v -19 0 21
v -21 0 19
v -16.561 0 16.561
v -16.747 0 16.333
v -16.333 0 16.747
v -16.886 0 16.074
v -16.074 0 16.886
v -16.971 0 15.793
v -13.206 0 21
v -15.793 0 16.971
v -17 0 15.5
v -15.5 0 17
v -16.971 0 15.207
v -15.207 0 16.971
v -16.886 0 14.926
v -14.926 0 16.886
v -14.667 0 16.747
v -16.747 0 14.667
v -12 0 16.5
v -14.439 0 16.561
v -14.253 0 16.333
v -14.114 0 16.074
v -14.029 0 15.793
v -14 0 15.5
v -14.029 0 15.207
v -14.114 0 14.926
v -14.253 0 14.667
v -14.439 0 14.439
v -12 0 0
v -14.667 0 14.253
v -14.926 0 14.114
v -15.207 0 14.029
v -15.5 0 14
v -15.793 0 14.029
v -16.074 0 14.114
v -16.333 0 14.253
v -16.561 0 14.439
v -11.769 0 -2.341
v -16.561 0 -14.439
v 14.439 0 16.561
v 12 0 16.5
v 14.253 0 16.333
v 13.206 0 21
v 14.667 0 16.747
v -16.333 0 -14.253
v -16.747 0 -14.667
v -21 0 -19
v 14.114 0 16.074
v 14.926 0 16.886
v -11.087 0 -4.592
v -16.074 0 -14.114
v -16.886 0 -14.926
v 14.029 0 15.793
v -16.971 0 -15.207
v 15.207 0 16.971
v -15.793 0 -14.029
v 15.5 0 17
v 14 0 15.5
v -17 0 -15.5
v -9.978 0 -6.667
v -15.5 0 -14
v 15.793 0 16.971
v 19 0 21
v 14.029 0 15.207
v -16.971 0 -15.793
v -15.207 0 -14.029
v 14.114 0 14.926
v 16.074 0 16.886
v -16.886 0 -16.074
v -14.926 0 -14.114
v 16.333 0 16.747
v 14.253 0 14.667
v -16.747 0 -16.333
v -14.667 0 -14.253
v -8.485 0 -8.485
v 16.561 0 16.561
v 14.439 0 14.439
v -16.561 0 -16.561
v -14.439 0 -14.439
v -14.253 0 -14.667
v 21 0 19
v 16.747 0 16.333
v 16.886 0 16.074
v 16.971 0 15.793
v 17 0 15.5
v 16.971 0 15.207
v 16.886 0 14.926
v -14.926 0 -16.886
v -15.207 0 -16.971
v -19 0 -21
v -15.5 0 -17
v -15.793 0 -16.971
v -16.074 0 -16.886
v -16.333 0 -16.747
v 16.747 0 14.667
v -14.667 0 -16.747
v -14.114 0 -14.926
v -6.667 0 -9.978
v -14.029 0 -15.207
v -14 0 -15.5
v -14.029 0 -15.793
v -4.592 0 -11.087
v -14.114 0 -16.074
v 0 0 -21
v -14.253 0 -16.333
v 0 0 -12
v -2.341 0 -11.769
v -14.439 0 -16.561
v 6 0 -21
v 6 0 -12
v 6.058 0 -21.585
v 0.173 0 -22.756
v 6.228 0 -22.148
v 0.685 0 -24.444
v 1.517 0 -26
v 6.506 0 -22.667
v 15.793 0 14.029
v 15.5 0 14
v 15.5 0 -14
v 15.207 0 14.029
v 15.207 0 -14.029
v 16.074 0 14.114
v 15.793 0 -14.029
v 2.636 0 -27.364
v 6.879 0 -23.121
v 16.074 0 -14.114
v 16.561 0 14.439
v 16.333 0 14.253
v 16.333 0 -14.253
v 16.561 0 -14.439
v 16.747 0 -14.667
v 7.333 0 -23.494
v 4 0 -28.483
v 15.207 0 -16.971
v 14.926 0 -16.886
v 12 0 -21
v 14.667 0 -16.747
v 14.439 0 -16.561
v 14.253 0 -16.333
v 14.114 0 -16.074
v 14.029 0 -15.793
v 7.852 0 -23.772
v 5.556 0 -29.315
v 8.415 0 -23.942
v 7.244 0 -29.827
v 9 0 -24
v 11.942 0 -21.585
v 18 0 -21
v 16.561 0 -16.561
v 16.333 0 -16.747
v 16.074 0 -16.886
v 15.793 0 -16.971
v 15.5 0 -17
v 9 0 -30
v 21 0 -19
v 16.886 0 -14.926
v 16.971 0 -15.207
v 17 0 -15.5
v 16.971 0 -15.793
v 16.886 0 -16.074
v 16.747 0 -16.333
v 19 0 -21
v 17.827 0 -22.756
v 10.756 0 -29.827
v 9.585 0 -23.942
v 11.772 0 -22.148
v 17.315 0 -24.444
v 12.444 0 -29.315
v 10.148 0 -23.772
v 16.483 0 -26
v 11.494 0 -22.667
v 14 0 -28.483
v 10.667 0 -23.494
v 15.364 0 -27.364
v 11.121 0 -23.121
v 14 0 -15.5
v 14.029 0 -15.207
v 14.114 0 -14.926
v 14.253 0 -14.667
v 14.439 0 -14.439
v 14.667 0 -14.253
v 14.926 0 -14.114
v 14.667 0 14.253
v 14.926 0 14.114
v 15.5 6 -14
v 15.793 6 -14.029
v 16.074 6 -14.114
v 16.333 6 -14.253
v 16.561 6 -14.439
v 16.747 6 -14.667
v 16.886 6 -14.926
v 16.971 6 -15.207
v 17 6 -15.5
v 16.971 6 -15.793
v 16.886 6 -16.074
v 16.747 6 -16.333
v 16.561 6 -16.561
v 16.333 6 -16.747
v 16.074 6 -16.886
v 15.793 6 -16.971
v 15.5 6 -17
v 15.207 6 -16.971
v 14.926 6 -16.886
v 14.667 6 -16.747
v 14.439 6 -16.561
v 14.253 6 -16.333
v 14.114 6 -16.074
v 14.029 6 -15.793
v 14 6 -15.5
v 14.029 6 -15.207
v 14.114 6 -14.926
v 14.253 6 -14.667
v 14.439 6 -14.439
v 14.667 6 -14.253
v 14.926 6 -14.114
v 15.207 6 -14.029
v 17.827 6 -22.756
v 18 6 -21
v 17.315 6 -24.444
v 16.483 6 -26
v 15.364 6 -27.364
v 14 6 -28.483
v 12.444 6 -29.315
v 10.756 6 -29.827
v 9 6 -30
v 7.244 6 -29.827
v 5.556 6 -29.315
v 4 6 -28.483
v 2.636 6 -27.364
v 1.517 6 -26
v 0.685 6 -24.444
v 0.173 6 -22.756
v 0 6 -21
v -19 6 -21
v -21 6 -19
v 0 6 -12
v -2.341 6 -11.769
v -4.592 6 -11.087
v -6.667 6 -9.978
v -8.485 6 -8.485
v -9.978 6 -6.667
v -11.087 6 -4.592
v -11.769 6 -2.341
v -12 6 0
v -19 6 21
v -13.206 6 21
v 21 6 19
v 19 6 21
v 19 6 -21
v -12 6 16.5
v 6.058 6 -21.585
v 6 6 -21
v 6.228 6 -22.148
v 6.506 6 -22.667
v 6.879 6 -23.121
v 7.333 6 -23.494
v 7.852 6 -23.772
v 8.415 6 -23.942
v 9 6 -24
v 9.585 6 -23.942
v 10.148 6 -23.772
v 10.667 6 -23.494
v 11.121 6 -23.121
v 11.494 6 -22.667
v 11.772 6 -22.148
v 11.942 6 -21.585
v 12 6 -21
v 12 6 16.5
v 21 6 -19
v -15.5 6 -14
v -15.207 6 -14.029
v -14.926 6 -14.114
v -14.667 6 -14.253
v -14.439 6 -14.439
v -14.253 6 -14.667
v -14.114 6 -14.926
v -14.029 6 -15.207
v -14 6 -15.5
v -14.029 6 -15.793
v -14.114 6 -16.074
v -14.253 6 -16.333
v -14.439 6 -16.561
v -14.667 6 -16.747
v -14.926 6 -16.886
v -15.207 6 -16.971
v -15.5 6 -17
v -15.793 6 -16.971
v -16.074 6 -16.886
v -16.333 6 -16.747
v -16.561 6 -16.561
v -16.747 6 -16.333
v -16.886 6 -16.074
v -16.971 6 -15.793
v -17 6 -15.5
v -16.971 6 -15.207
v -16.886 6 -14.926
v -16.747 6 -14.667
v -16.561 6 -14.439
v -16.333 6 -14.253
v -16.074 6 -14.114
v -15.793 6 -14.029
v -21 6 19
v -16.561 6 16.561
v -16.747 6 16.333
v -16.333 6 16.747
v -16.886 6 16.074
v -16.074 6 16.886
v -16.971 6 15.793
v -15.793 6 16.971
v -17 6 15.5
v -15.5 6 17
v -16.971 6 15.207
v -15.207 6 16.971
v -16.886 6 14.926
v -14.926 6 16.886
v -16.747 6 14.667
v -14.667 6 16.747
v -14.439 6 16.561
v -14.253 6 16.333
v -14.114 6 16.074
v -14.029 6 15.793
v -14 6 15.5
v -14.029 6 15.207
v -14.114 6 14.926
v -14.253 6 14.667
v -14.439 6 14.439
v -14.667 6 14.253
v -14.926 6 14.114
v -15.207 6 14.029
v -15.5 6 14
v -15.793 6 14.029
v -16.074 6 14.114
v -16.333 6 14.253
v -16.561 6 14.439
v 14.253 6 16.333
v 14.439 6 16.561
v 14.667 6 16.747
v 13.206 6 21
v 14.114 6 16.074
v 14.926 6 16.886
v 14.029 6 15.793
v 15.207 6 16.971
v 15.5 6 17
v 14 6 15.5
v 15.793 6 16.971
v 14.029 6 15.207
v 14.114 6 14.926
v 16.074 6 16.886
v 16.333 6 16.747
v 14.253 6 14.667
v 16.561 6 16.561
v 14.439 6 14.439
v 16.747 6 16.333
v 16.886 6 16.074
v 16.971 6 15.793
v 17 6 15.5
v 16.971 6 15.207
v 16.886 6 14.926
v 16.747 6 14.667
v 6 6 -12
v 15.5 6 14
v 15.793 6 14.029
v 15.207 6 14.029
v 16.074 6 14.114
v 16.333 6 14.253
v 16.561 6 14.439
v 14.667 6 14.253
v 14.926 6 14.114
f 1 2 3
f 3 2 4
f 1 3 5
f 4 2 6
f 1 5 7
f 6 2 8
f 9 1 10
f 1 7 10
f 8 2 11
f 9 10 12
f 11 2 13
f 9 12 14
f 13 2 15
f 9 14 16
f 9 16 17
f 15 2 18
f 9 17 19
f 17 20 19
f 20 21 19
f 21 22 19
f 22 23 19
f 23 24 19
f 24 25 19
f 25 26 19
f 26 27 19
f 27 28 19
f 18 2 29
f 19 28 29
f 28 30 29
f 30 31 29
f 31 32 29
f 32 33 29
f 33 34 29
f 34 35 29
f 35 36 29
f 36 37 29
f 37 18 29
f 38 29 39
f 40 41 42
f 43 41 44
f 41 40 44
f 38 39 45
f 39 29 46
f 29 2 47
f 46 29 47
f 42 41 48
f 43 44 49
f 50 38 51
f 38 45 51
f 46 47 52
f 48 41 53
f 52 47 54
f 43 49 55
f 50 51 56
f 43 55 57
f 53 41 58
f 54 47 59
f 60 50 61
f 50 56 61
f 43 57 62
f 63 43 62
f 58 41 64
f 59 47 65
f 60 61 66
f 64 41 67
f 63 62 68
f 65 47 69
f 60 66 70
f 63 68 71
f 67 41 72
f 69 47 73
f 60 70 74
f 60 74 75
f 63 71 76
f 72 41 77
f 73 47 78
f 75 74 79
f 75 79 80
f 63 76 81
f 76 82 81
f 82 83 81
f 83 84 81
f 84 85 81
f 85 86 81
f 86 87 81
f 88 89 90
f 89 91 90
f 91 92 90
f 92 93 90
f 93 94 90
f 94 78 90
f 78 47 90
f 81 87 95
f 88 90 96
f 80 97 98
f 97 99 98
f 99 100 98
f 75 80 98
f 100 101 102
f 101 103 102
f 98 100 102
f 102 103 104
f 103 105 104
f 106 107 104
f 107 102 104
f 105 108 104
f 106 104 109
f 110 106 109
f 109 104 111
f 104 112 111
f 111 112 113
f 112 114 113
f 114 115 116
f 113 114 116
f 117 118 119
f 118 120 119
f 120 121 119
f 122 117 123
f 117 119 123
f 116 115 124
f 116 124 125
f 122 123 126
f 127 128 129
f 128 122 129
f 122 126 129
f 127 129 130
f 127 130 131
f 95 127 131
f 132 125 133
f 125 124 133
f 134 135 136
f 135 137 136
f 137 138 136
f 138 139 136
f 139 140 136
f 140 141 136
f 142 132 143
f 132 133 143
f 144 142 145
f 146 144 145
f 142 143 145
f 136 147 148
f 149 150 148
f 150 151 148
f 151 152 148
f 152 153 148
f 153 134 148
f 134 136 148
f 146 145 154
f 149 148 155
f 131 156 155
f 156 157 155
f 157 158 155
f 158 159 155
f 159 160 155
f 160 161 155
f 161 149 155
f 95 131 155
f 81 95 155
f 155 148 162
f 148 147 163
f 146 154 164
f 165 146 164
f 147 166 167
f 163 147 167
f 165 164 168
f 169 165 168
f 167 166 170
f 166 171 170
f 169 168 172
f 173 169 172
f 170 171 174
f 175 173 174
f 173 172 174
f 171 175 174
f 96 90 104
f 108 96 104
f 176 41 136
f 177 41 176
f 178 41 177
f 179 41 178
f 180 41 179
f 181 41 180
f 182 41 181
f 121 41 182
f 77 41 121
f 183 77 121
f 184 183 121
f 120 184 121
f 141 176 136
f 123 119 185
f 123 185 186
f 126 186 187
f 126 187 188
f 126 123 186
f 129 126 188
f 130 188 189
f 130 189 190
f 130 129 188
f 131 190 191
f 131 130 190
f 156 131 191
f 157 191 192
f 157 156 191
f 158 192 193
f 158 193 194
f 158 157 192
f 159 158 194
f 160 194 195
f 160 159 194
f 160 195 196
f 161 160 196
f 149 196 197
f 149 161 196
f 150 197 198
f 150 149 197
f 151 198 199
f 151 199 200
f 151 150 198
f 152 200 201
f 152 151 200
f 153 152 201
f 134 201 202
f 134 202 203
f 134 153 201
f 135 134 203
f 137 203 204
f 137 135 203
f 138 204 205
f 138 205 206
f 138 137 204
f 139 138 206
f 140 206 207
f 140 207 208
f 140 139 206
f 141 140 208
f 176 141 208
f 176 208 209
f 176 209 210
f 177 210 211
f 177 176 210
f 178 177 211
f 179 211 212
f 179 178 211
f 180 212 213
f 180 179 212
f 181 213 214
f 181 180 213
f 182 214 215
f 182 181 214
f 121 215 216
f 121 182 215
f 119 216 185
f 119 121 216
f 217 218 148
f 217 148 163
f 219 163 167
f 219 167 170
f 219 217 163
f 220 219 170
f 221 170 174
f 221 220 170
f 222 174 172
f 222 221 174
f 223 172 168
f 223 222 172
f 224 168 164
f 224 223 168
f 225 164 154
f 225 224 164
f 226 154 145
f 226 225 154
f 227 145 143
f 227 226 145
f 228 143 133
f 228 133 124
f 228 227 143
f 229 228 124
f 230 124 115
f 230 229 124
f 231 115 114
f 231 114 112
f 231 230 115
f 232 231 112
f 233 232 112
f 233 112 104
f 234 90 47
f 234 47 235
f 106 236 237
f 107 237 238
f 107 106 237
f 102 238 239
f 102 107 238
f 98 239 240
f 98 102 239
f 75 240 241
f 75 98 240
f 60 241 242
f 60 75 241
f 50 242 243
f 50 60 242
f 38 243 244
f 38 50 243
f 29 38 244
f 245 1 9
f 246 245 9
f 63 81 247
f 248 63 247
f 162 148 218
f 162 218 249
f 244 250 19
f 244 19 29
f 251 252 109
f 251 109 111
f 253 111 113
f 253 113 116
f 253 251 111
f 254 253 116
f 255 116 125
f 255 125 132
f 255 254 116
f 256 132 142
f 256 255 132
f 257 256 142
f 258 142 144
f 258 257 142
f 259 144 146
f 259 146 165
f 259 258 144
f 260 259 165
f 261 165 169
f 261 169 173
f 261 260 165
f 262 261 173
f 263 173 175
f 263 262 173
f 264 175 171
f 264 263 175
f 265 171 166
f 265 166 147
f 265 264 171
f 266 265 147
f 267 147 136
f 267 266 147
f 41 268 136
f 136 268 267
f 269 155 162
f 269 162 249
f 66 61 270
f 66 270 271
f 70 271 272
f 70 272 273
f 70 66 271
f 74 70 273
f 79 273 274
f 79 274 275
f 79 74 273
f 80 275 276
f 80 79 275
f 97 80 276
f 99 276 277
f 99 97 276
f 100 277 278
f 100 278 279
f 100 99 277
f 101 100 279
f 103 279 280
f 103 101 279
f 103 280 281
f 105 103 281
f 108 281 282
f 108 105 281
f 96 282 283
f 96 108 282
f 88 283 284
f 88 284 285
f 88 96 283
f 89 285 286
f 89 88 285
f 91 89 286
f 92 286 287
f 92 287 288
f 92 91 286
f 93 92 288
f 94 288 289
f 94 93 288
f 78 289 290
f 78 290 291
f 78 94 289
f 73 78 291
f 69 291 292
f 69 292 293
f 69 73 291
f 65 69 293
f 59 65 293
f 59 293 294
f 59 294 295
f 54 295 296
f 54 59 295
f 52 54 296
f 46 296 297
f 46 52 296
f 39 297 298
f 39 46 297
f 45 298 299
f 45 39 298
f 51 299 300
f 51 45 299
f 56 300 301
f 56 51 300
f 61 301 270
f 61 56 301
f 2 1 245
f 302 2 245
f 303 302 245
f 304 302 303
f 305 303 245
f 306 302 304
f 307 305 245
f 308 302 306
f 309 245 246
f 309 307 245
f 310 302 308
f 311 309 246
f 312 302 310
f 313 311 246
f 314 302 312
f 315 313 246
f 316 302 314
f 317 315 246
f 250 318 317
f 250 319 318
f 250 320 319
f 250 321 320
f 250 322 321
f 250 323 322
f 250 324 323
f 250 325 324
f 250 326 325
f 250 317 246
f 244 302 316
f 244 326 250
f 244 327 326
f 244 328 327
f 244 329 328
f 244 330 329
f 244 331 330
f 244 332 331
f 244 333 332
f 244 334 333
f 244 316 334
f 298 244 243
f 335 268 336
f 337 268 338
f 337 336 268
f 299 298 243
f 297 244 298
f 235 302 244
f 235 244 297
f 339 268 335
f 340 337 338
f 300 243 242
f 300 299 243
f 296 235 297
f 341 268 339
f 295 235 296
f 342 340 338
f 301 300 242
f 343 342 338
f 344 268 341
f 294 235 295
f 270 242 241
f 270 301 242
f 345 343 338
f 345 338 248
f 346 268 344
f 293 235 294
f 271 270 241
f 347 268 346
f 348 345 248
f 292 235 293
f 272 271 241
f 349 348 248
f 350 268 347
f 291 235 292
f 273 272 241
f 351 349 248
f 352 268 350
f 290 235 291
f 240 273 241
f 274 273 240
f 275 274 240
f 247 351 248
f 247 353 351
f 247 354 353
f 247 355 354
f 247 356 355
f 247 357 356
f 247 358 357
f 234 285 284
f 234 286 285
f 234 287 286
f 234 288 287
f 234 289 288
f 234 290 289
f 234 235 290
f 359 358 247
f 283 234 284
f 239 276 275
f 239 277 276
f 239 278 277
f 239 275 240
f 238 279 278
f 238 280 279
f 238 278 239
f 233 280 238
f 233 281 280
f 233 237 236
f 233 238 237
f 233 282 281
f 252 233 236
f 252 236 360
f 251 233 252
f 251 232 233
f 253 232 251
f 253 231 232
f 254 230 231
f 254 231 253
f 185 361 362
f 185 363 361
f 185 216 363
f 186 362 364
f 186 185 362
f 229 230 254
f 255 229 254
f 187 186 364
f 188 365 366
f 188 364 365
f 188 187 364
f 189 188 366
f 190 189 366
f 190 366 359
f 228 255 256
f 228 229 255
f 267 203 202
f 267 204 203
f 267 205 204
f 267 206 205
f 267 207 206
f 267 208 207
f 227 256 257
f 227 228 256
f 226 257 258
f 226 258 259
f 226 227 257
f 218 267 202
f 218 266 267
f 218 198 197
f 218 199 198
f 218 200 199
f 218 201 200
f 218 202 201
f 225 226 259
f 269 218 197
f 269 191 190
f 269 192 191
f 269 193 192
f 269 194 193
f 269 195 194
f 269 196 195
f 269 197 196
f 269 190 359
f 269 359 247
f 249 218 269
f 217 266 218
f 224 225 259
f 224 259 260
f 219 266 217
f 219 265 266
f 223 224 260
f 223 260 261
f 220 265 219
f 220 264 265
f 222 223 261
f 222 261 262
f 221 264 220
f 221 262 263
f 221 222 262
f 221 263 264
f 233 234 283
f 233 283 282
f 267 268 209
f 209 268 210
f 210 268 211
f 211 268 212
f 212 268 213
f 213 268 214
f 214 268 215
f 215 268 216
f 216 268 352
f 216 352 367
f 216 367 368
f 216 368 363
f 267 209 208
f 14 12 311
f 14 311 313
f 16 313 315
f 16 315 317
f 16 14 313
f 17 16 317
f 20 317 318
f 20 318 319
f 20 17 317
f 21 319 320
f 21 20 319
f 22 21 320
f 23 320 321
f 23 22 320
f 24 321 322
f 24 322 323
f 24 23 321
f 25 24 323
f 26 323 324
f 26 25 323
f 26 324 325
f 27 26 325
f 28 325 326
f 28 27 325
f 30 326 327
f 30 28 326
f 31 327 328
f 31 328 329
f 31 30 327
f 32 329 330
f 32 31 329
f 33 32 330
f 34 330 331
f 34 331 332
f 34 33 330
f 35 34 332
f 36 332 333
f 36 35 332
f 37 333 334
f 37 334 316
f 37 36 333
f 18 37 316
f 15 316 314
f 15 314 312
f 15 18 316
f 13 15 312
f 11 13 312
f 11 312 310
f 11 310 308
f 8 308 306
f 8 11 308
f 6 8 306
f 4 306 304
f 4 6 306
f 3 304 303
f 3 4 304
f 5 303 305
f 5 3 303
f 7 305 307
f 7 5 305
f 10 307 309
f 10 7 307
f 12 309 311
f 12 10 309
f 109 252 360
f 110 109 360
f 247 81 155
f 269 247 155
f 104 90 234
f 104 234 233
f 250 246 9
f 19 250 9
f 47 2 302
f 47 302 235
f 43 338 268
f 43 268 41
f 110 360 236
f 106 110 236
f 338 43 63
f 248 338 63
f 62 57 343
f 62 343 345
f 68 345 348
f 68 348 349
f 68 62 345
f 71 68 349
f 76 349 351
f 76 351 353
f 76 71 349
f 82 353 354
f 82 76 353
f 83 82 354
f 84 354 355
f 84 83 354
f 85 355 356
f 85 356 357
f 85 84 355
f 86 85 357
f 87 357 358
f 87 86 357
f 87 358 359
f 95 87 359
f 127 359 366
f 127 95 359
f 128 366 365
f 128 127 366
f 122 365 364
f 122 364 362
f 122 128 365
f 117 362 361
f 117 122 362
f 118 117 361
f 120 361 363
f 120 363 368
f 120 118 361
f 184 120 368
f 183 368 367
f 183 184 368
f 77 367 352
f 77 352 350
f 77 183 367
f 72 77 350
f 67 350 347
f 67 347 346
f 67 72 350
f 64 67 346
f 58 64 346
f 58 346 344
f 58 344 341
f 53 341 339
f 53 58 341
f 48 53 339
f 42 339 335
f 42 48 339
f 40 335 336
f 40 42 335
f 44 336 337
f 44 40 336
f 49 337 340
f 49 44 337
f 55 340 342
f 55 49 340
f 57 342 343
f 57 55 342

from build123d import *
from OCP.BRepFilletAPI import BRepFilletAPI_MakeChamfer

# Parameters (mm, degrees)
SKETCH1_W           = 42
SKETCH1_H           = 42
SKETCH1_R           = 12
SKETCH1_R_2         = 1.5
BOSS_EXTRUDE1_DEPTH = 6
CHAMFER1_SIZE       = 2
SKETCH2_W           = 24
SKETCH2_H           = 21
CUT_EXTRUDE1_DEPTH  = 31.298514815
CHAMFER2_SIZE       = 4.5
CHAMFER2_SIZE2      = 1.205771366
BOSS_EXTRUDE2_DEPTH = 6
CUT_EXTRUDE2_DEPTH  = 43.107006543


with BuildPart() as part:
    # Sketch1 → Boss-Extrude1 (new body)
    with BuildSketch(Plane(origin=(0, 0, 0), x_dir=(1, 0, 0), z_dir=(0, 1, 0))):
        Rectangle(SKETCH1_W, SKETCH1_H)
        with Locations(Location((0, 0, 0), (0, 0, 270))):
            Circle(SKETCH1_R, mode=Mode.SUBTRACT)
        with Locations(Location((-15.5, 15.5, 0), (0, 0, 270))):
            Circle(SKETCH1_R_2, mode=Mode.SUBTRACT)
        with Locations(Location((15.5, 15.5, 0), (0, 0, 270))):
            Circle(SKETCH1_R_2, mode=Mode.SUBTRACT)
        with Locations(Location((15.5, -15.5, 0), (0, 0, 270))):
            Circle(SKETCH1_R_2, mode=Mode.SUBTRACT)
        with Locations(Location((-15.5, -15.5, 0), (0, 0, 270))):
            Circle(SKETCH1_R_2, mode=Mode.SUBTRACT)
    extrude(amount=BOSS_EXTRUDE1_DEPTH)

    # Chamfer1
    chamfer1_edges = [part.edges().sort_by_distance(p)[0] for p in [
        (21, 3, 21),
        (-21, 3, 21),
        (-21, 3, -21),
        (21, 3, -21),
    ]]
    chamfer(chamfer1_edges, length=CHAMFER1_SIZE)

    # Sketch2 → Cut-Extrude1 (cut, through all)
    with BuildSketch(Plane(origin=(0, 6, 0), x_dir=(1, 0, 0), z_dir=(0, 1, 0))):
        with Locations((0, -10.5)):
            Rectangle(SKETCH2_W, SKETCH2_H)
    extrude(amount=-CUT_EXTRUDE1_DEPTH, mode=Mode.SUBTRACT)

    # Chamfer2: one chamfer whose edges measure the first distance from different faces: ONE call of the kernel's chamfer builder (chamfer() names one face for all edges)
    chamfer2_edges_1 = [part.edges().sort_by_distance(p)[0] for p in [
        (12, 3, 21),
    ]]
    chamfer2_side_1 = [part.faces().sort_by_distance(p)[0] for p in [
        (12, 3, 10.5),
    ]]
    chamfer2_edges_2 = [part.edges().sort_by_distance(p)[0] for p in [
        (-12, 3, 21),
    ]]
    chamfer2_side_2 = [part.faces().sort_by_distance(p)[0] for p in [
        (-12, 3, 10.5),
    ]]
    chamfer2 = BRepFilletAPI_MakeChamfer(part.part.solid().wrapped)
    for e in chamfer2_edges_1:
        chamfer2.Add(CHAMFER2_SIZE, CHAMFER2_SIZE2, e.wrapped, chamfer2_side_1[0].wrapped)  # the first distance lies on this face
    for e in chamfer2_edges_2:
        chamfer2.Add(CHAMFER2_SIZE, CHAMFER2_SIZE2, e.wrapped, chamfer2_side_2[0].wrapped)  # the first distance lies on this face
    add(Compound.cast(chamfer2.Shape()), mode=Mode.REPLACE)

    # Sketch3 → Boss-Extrude2 (add)
    with BuildSketch(Plane(origin=(0, 6, 0), x_dir=(1, 0, 0), z_dir=(0, 1, 0))):
        with BuildLine():
            Line((0, 21), (6, 21))
            ThreePointArc((6, 21), (9, 24), (12, 21))
            Line((12, 21), (18, 21))
            ThreePointArc((18, 21), (9, 30), (0, 21))
        make_face()
    extrude(amount=-BOSS_EXTRUDE2_DEPTH)

    # Sketch4 → Cut-Extrude2 (cut, through all)
    with BuildSketch(Plane(origin=(0, 6, 6), x_dir=(1, 0, 0), z_dir=(0, 1, 0))):
        with BuildLine():
            Line((12, 6), (12, 27))
            ThreePointArc((12, 27), (9, 30), (6, 27))
            Line((6, 27), (6, 18))
            Line((6, 18), (0, 18))
            Line((0, 18), (0, 6))
            Line((0, 6), (12, 6))
        make_face()
    extrude(amount=-CUT_EXTRUDE2_DEPTH, mode=Mode.SUBTRACT)


solid = part.part
